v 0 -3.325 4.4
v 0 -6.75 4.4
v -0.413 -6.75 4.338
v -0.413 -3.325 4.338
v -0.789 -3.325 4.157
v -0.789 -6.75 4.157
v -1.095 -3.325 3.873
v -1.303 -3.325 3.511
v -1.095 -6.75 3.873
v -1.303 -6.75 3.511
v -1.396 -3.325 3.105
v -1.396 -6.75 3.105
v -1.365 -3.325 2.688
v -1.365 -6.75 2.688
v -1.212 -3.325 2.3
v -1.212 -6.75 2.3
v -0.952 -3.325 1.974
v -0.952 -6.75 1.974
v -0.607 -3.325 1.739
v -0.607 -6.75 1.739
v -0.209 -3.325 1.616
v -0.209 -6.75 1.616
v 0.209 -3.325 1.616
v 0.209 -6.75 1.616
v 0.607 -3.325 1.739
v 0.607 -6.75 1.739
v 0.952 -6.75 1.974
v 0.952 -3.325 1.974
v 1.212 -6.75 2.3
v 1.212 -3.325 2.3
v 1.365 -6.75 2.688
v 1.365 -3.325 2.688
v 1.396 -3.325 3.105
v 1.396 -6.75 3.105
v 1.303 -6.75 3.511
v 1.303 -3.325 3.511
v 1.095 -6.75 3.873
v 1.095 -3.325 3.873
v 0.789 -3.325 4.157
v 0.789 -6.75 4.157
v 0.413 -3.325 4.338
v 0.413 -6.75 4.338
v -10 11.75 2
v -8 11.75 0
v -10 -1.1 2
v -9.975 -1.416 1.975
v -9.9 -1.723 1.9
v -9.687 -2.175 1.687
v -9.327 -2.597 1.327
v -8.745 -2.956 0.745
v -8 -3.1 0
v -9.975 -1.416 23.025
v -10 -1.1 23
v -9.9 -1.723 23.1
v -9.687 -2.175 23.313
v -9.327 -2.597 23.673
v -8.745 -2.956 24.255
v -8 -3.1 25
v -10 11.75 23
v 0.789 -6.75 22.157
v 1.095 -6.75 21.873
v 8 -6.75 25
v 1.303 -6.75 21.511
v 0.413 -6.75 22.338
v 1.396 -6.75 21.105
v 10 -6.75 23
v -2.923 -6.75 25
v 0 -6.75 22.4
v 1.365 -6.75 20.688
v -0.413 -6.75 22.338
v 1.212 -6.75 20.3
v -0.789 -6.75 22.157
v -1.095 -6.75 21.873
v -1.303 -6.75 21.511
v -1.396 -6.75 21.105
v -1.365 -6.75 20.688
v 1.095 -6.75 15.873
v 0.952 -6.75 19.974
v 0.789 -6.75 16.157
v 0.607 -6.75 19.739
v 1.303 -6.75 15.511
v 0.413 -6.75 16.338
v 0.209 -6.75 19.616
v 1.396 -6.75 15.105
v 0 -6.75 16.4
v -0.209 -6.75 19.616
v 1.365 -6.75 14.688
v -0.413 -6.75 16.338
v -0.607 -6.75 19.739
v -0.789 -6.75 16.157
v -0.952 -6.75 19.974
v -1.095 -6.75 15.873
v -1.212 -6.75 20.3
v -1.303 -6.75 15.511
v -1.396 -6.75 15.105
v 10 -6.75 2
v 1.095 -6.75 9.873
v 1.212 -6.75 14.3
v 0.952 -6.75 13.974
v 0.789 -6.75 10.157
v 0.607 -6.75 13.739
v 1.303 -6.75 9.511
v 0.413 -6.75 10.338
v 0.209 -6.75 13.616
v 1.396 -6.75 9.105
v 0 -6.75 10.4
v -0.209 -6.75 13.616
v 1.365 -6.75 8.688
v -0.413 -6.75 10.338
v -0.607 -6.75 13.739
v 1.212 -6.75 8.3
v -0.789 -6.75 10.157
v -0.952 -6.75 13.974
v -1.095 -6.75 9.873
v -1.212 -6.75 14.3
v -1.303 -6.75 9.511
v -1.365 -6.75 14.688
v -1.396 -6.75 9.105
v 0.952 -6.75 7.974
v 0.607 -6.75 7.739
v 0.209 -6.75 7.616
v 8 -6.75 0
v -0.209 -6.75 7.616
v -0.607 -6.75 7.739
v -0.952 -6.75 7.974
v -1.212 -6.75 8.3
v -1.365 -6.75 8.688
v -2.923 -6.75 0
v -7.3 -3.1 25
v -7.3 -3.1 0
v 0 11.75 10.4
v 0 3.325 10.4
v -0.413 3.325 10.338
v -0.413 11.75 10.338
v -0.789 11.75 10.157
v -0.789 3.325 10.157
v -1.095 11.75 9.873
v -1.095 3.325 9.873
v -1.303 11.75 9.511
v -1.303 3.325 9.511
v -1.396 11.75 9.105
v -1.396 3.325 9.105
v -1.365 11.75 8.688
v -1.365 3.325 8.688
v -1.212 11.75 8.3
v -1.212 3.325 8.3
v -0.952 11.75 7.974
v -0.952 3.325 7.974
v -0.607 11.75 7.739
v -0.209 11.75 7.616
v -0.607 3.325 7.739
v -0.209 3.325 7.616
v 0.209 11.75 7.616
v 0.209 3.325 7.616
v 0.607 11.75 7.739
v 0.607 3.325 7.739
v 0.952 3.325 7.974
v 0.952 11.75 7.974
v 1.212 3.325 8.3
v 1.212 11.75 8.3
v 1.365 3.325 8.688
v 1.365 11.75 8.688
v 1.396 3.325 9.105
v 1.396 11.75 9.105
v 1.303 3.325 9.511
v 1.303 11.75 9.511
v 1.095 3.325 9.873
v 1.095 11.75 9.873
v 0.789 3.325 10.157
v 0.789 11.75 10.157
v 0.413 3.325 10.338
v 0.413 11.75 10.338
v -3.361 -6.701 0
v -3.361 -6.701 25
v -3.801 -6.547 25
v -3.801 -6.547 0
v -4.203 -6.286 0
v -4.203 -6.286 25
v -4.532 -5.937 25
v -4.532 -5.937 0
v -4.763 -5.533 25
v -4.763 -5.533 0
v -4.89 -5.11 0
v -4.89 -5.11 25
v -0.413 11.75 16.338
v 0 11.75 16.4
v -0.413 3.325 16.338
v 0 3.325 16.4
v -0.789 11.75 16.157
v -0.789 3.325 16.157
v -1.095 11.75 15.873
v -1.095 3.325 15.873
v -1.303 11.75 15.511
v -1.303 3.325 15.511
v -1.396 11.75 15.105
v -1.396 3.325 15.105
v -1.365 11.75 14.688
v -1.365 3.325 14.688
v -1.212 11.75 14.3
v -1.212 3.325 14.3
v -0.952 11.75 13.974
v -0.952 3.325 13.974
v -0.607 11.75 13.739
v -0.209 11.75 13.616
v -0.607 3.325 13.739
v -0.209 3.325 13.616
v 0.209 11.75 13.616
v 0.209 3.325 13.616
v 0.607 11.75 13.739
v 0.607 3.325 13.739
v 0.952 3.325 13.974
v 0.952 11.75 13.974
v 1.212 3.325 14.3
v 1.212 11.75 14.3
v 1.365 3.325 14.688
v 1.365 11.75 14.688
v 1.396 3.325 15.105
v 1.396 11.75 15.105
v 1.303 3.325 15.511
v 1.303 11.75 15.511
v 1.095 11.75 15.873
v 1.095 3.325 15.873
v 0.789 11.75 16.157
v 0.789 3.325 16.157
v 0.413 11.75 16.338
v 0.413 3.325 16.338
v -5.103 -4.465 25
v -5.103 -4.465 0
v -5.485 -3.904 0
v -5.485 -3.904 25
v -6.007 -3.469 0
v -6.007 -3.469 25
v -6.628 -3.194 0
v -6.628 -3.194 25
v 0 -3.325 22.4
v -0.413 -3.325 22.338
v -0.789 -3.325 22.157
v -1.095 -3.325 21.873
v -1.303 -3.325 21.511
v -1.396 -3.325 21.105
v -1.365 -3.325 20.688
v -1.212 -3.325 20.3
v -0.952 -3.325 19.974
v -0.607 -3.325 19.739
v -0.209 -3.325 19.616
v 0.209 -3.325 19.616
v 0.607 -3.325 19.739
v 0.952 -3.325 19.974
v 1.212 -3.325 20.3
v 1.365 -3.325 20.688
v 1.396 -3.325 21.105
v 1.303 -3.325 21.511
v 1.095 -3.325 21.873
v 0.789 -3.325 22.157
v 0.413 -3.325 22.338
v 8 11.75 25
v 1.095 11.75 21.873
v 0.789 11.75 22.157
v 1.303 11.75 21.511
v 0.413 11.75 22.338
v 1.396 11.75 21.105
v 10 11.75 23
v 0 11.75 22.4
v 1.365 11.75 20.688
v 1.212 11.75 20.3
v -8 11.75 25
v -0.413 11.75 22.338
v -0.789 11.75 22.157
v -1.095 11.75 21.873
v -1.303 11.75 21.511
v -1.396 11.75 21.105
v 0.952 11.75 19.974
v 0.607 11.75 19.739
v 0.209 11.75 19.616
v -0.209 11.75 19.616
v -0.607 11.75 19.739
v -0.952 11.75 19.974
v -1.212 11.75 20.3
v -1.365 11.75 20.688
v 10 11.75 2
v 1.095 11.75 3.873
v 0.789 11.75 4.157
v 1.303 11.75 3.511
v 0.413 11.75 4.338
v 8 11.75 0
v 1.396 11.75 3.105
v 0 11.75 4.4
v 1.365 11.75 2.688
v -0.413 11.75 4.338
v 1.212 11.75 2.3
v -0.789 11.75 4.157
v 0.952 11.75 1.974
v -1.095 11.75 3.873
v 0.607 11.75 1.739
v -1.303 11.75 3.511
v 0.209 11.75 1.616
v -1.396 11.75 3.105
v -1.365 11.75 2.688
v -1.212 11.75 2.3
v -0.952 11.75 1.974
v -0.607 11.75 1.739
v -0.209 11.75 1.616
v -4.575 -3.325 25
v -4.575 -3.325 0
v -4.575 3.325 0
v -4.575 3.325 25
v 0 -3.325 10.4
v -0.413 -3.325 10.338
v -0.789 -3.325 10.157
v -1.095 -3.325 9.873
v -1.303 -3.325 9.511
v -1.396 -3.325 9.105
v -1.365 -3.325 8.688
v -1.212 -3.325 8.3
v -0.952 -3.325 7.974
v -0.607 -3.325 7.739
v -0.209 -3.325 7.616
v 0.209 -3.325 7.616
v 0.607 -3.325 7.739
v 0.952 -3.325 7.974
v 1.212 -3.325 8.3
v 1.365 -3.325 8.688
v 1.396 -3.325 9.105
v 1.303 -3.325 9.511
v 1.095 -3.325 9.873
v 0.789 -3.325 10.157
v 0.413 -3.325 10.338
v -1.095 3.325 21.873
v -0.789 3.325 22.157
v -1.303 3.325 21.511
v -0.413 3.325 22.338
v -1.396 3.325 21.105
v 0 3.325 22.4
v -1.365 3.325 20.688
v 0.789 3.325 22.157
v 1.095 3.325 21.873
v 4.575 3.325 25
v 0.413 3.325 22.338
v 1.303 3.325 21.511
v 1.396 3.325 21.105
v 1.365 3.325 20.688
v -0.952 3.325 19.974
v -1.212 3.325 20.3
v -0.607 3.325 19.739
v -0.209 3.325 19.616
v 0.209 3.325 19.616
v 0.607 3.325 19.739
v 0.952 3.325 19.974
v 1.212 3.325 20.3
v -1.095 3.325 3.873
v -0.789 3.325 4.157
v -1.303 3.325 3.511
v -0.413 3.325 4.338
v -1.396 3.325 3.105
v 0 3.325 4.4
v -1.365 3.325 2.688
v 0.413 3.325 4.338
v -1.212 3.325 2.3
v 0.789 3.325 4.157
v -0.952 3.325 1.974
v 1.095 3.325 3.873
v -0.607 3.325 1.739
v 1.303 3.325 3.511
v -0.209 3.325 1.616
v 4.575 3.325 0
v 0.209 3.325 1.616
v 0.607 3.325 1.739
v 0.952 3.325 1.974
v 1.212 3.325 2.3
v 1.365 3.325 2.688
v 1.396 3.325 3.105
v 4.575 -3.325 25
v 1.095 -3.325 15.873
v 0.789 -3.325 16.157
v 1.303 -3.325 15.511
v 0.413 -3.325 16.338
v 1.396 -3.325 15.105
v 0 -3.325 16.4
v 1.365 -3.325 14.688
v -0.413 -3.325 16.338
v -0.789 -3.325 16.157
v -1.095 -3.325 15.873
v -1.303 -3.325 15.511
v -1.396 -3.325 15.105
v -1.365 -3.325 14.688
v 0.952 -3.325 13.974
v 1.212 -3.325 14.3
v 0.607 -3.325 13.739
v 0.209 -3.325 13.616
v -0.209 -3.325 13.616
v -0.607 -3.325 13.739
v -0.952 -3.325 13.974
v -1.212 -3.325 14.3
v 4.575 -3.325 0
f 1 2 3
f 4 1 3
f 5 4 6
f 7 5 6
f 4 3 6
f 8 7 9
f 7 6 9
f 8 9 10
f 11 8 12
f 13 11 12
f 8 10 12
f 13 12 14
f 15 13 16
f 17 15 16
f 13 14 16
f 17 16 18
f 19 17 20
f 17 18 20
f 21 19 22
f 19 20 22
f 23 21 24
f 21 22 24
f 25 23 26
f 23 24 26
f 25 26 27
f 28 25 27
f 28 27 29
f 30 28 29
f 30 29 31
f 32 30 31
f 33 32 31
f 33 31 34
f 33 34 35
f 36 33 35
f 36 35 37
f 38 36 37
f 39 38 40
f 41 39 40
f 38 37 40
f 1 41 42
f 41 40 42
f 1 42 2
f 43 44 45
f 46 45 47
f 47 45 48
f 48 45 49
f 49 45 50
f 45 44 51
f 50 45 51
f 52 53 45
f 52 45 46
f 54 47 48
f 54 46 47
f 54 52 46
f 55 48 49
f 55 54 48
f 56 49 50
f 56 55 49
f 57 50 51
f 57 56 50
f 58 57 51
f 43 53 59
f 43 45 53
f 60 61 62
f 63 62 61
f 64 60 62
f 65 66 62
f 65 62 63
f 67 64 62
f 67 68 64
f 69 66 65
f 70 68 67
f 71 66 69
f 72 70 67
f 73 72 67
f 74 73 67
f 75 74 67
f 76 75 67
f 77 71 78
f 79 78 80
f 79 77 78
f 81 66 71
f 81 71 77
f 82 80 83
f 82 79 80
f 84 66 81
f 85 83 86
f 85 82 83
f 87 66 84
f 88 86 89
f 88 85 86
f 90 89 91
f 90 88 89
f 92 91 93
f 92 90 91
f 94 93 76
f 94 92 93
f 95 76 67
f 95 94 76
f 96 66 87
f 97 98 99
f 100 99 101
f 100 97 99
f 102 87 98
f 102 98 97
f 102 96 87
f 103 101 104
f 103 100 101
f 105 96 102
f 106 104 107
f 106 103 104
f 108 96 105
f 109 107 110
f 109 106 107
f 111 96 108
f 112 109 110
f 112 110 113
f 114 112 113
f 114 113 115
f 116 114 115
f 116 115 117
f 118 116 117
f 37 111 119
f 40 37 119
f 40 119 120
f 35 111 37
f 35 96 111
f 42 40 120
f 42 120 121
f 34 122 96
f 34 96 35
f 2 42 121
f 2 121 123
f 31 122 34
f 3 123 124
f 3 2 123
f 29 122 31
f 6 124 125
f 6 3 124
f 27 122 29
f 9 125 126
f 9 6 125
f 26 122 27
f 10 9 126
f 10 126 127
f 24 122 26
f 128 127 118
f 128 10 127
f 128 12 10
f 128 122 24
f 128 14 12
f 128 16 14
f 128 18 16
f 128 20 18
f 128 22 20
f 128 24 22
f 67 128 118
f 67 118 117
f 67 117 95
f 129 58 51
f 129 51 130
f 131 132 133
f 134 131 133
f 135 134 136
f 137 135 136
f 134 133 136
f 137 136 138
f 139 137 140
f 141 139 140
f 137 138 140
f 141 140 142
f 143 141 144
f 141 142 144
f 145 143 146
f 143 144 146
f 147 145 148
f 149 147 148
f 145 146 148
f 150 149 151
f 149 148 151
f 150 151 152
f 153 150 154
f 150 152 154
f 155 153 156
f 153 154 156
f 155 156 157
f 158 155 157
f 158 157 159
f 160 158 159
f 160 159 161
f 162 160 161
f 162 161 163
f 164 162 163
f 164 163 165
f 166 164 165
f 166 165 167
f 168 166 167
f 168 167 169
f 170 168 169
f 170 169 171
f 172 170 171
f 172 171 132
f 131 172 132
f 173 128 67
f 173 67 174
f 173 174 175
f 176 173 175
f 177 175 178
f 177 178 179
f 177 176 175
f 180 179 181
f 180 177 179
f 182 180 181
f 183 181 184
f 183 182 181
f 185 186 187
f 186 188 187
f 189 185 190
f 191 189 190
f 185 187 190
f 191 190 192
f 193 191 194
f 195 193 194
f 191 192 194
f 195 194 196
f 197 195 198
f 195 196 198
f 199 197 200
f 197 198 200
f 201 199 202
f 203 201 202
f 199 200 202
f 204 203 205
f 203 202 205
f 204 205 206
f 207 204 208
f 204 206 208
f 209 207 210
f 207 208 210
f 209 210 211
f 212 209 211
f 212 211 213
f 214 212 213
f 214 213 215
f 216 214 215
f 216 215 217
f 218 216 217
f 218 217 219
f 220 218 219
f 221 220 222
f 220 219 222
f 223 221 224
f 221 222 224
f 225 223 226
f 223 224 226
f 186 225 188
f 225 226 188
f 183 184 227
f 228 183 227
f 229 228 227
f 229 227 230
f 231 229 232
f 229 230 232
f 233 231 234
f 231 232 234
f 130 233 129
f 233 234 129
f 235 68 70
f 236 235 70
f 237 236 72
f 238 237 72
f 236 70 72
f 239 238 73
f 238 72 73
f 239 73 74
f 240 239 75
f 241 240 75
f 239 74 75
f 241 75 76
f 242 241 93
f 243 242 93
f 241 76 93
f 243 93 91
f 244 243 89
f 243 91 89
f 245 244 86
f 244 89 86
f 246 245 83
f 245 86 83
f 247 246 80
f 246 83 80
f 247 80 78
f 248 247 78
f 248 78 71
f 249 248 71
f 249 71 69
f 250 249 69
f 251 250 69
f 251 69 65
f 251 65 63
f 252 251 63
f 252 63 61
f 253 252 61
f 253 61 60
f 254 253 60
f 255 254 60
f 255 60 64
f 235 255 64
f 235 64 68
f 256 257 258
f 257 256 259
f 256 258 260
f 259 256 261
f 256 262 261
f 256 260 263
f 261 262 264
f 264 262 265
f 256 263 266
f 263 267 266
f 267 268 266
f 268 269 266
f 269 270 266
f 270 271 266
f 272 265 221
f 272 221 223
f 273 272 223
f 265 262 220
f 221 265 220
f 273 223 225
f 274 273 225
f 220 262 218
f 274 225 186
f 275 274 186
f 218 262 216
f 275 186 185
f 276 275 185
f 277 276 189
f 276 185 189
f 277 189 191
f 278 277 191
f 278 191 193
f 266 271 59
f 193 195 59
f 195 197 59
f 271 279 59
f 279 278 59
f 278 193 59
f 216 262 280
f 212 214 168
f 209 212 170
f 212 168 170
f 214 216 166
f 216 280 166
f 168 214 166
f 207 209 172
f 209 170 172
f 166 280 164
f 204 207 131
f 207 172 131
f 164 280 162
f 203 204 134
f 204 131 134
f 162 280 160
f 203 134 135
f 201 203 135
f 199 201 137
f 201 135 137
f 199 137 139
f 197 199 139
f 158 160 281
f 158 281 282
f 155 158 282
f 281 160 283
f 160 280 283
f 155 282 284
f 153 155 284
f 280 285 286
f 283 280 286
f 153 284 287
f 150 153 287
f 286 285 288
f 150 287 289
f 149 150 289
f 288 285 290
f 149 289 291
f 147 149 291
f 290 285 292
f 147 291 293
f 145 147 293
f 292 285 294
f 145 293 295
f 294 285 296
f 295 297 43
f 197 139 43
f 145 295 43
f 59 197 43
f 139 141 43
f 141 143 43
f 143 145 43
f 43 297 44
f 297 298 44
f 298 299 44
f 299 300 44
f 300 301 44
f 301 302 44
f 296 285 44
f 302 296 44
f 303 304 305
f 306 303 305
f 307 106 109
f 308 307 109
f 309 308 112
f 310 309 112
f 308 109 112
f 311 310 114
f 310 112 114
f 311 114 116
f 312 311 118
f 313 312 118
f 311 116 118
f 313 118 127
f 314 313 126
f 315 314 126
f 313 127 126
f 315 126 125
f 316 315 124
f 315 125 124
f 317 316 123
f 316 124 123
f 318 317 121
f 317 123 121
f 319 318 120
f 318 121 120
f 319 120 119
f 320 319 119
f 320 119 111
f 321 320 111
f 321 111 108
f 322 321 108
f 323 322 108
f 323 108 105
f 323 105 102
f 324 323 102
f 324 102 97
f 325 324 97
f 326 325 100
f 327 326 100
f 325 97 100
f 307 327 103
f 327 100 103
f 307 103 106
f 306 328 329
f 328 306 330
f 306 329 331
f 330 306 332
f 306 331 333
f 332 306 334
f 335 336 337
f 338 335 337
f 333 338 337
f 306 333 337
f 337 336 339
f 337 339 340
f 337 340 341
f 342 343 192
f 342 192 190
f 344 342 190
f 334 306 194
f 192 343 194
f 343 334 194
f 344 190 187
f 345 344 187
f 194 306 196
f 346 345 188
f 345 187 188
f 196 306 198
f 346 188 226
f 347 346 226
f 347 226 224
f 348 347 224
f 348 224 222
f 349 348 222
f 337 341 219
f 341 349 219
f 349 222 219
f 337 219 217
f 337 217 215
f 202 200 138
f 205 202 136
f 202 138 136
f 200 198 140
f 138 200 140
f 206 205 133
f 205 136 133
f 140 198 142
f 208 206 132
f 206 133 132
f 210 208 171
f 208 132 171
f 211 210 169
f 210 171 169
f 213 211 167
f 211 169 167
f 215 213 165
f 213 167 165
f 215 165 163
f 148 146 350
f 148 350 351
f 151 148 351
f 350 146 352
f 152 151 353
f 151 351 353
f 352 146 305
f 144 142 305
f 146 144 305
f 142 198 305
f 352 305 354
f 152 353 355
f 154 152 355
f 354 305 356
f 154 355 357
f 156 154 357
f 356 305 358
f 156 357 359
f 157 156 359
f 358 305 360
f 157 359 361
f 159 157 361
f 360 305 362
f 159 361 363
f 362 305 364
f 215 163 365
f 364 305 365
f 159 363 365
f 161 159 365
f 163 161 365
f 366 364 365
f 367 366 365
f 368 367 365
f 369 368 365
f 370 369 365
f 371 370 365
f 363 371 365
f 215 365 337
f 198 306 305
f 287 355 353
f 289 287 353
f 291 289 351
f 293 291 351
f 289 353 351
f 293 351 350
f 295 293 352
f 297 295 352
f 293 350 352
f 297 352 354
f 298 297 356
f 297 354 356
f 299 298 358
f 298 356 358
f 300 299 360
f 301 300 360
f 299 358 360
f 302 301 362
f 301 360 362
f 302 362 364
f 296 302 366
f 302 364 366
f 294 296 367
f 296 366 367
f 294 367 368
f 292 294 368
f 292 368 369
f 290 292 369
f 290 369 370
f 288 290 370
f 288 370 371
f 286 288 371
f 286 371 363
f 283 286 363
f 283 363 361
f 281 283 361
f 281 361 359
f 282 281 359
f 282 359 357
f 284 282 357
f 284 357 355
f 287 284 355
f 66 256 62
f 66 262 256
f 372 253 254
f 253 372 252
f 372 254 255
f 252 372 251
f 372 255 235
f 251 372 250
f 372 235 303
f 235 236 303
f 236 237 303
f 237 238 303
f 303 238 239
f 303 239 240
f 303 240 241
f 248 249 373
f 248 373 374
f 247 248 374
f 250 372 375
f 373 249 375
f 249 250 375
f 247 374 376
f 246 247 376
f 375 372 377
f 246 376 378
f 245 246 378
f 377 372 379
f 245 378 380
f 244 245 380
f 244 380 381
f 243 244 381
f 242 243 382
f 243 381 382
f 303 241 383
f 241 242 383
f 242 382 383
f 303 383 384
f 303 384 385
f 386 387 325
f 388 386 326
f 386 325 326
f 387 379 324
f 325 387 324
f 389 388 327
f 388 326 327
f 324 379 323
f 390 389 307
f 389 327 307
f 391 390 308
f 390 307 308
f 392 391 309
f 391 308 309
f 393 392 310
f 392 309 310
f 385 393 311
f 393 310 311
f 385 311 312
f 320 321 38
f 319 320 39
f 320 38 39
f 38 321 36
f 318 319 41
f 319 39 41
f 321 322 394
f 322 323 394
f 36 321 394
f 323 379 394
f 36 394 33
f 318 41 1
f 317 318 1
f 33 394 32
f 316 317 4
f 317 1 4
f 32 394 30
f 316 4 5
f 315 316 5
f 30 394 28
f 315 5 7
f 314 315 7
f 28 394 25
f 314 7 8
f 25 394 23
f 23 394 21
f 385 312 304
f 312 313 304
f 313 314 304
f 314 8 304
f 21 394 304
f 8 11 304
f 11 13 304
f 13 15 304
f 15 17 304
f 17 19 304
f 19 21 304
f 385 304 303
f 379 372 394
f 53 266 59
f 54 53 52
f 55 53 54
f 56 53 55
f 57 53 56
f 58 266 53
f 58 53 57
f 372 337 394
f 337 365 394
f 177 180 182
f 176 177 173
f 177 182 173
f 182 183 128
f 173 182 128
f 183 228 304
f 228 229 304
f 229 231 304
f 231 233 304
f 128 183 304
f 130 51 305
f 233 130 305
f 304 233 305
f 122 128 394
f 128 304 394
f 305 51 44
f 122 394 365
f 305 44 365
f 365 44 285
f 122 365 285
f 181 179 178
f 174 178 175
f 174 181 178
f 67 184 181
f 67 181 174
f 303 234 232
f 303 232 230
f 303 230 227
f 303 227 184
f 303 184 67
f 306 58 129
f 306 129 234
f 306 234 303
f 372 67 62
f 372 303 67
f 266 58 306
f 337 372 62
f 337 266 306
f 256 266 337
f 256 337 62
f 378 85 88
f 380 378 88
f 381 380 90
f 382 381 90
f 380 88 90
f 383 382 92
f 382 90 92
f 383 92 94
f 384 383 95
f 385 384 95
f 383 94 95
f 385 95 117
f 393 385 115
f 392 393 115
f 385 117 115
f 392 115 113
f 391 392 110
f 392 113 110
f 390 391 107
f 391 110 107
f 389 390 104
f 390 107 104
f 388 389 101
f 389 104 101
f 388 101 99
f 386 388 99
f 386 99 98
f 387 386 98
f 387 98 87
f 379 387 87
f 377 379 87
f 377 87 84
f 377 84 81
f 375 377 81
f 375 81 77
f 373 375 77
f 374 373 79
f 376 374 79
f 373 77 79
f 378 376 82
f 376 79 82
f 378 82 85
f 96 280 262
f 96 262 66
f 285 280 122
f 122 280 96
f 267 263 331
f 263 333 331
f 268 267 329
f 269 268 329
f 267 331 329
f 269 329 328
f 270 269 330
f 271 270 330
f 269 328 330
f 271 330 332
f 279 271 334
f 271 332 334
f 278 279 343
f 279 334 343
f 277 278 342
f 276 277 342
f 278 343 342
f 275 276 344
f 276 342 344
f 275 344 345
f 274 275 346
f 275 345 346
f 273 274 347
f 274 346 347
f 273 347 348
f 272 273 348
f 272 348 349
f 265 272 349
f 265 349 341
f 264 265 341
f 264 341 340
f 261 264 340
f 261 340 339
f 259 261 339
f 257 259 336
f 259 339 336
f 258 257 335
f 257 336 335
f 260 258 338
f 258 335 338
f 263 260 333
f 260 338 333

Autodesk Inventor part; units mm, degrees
ref_plane "YZ Plane" through (0, 0, 0) normal (1, 0, 0) x (0, 1, 0)
ref_plane "XZ Plane" through (0, 0, 0) normal (0, 1, 0) x (-1, 0, 0)
ref_plane "XY Plane" through (0, 0, 0) normal (0, 0, 1) x (1, 0, 0)
sketch "Skizze1" plane through (0, 0, 0) normal (0, 0, 1) x (1, 0, 0)
  line L0 (-4.5, 3.25) -> (-4.5, 2.25) projected
  arc A0 (-3.564, 1.602) -> (-4.5, 2.25) centre (-4.5, 1.25) ccw projected
  line L1 (-3.564, 1.602) -> (-3.2351, 1.602) projected
  line L2 (-3.2351, 1.602) -> (-3.2351, 0.898) projected
  line L3 (-3.2351, 0.898) -> (-3.564, 0.898) projected
  arc A1 (-4.5, 0.25) -> (-3.564, 0.898) centre (-4.5, 1.25) ccw projected
  line L4 (-4.5, 0.25) -> (-4.5, -3.25) projected
  line L5 (-4.5, -3.25) -> (4.5, -3.25) projected
  line L6 (4.5, -3.25) -> (4.5, 0.25) projected
  arc A2 (3.564, 0.898) -> (4.5, 0.25) centre (4.5, 1.25) ccw projected
  line L7 (3.564, 0.898) -> (3.2351, 0.898) projected
  line L8 (3.2351, 0.898) -> (3.2351, 1.602) projected
  line L9 (3.2351, 1.602) -> (3.564, 1.602) projected
  arc A3 (4.5, 2.25) -> (3.564, 1.602) centre (4.5, 1.25) ccw projected
  line L10 (4.5, 2.25) -> (4.5, 3.25) projected
  line L11 (4.5, 3.25) -> (-4.5, 3.25) projected
  line L12 (4.575, -3.325) -> (-4.575, -3.325)
  line L13 (-4.575, -3.325) -> (-4.575, 0.328)
  arc A4 (-4.575, 0.328) -> (-3.6174, 0.973) centre (-4.5, 1.25) ccw
  line L14 (-3.6174, 0.973) -> (-3.3101, 0.973)
  line L15 (-3.3101, 0.973) -> (-3.3101, 1.527)
  line L16 (-3.3101, 1.527) -> (-3.6174, 1.527)
  arc A5 (-3.6174, 1.527) -> (-4.575, 2.172) centre (-4.5, 1.25) ccw
  line L17 (-4.575, 2.172) -> (-4.575, 3.325)
  line L18 (-4.575, 3.325) -> (4.575, 3.325)
  line L19 (4.575, 3.325) -> (4.575, 2.172)
  arc A6 (4.575, 2.172) -> (3.6174, 1.527) centre (4.5, 1.25) ccw
  line L20 (3.6174, 1.527) -> (3.3101, 1.527)
  line L21 (3.3101, 1.527) -> (3.3101, 0.973)
  line L22 (3.3101, 0.973) -> (3.6174, 0.973)
  arc A7 (3.6174, 0.973) -> (4.575, 0.328) centre (4.5, 1.25) ccw
  line L23 (4.575, 0.328) -> (4.575, -3.325)
  circle A8 centre (-15.1, -13.35) radius 3.5 projected
  line L24 (-20.2, -17.25) -> (-22.2, -15.25) projected
  line L25 (-20.2, -17.25) -> (9.8, -17.25) projected
  line L26 (9.8, -17.25) -> (9.8, 6.75) projected
  line L27 (-11.8, 6.75) -> (9.8, 6.75) projected
  line L28 (-11.8, 11.75) -> (-11.8, 6.75) projected
  line L29 (-20.2, 11.75) -> (-11.8, 11.75) projected
  line L30 (-22.2, 9.75) -> (-20.2, 11.75) projected
  line L31 (-22.2, -15.25) -> (-22.2, 9.75) projected
  line L32 (-11.8, 6.75) -> (-9.8, 6.75) projected
  line L33 (-9.8, 6.75) -> (-9.8, 11.75) projected
  line L34 (-9.8, 11.75) -> (-11.8, 11.75) projected
  line L35 (-11.8, 11.75) -> (-11.8, 6.75) projected
  line L36 (9.8, 11.75) -> (-20.2, 11.75) projected
  circle A9 centre (-15.1, -13.35) radius 1.1 projected
  line L37 (-22.2, -15.25) -> (-20.2, -17.25) projected
  line L38 (-22.2, -15.25) -> (-22.2, 9.75) projected
  line L39 (-20.2, 11.75) -> (-22.2, 9.75) projected
  line L40 (9.8, 11.75) -> (-20.2, 11.75) projected
  line L41 (9.8, -17.25) -> (9.8, 11.75) projected
  line L42 (9.8, -17.25) -> (-20.2, -17.25) projected
  line L43 (-10, 6.75) -> (10, 6.75)
  line L44 (10, 6.75) -> (10, -6.75)
  line L45 (10, -6.75) -> (-10, -6.75)
  line L46 (-10, -6.75) -> (-10, 6.75)
  line L47 (-10, 6.75) -> (10, -6.75) construction
  line L48 (10, 6.75) -> (-10, -6.75) construction
  line L49 (10, 6.75) -> (-10, 6.75)
  line L50 (-10, 6.75) -> (-10, 11.75)
  line L51 (-10, 11.75) -> (10, 11.75)
  line L52 (10, 11.75) -> (10, 6.75)
  line L53 (-4.575, 0.328) -> (-4.575, 2.172)
  line L54 (4.575, 0.328) -> (4.575, 2.172)
  line L55 (9.8, 11.75) -> (-20.2, 11.75) projected
  point P0 (0, 0)
  point P1 (4.5, -1.5)
  point P2 (4.575, -1.4985)
  dimension "d0" = 0.075
  dimension "d1" = 20
  dimension "d2" = 13.5
extrude "Extrusion1" add sketch "Skizze1" along normal blind 25 contours L45 L46 L27 L26 | L26 L43 L44 L45 | L27 L33 L36 L41 | L41 L51 L52 L43 | L27 L50 L34 L33
sketch "Skizze2" plane through (-10, 11.75, 0) normal (0, 1, 0) x (1, 0, 0)
  line L0 (20, 0) -> (0, 0) projected
  line L1 (0, 0) -> (0, -25) projected
  line L2 (20, -25) -> (0, -25) projected
  line L3 (20, 0) -> (20, -25) projected
  line L4 (10, -12.6) -> (10, 75.6)
  point P0 (10, 0)
  point P1 (10, -3)
  dimension "d5" = 3
hole "Bohrung1" at (0, 11.75, 3) direction (0, -1, 0) diameter 2.8 end through all
pattern_linear "Rechteckige Anordnung1" count 4 spacing 6 along (0, 0, 1) of "Bohrung1"
chamfer "Fasen1" distance 2 angle 45 4 edges at (-10, 2.5, 0) (-10, 2.5, 25) (10, 2.5, 0) (10, 2.5, 25)
sketch "Skizze3" plane through (0, 0, 25) normal (0, 0, 1) x (1, 0, 0)
  line L0 (-5, -18.15) -> (-5, -21.15) projected
  line L1 (-22.9, -3.25) -> (-19.9, -3.25) projected
  circle A0 centre (-15.1, -13.35) radius 1.4224 projected
  line L2 (-5, -5.55) -> (-5, -8.55) projected
  arc A1 (-5, -5.55) -> (-7.3, -3.25) centre (-7.3, -5.55) ccw projected
  line L3 (-10.3, -3.25) -> (-7.3, -3.25) projected
  line L4 (-25.2, -23.45) -> (-5, -23.45)
  line L5 (-5, -23.45) -> (-5, -3.25)
  line L6 (-5, -3.25) -> (-25.2, -3.25)
  line L7 (-25.2, -3.25) -> (-25.2, -23.45)
  line L8 (-25.2, -23.45) -> (-5, -3.25) construction
  line L9 (-5, -23.45) -> (-25.2, -3.25) construction
  line L10 (-10.3, -3.1) -> (-7.3, -3.1)
  arc A2 (-4.85, -5.55) -> (-7.3, -3.1) centre (-7.3, -5.55) ccw
  line L11 (-4.85, -5.55) -> (-4.85, -8.55)
  line L12 (-4.85, -3.1) -> (-4.85, -23.6)
  line L13 (-4.85, -23.6) -> (-25.35, -23.6)
  line L14 (-25.35, -23.6) -> (-25.35, -3.1)
  line L15 (-25.35, -3.1) -> (-4.85, -3.1)
  point P0 (0, 0)
  dimension "d19" = 0.15
extrude "Extrusion2" cut sketch "Skizze3" against normal blind 25 contours L5 L2 A2 L11 L12 L13 L14 L15 L10 L6 L3 L1 L7 L4 L0 | L0 L5 L4 L7 L6 L1 L3 A1 L2 | A1 L6 A2 L5
fillet "Rundung1" radius 2 2 edges at (-4.85, -6.75, 12.5) (-10, -3.1, 12.5)
properties part number "OT2-Gripper_block"
